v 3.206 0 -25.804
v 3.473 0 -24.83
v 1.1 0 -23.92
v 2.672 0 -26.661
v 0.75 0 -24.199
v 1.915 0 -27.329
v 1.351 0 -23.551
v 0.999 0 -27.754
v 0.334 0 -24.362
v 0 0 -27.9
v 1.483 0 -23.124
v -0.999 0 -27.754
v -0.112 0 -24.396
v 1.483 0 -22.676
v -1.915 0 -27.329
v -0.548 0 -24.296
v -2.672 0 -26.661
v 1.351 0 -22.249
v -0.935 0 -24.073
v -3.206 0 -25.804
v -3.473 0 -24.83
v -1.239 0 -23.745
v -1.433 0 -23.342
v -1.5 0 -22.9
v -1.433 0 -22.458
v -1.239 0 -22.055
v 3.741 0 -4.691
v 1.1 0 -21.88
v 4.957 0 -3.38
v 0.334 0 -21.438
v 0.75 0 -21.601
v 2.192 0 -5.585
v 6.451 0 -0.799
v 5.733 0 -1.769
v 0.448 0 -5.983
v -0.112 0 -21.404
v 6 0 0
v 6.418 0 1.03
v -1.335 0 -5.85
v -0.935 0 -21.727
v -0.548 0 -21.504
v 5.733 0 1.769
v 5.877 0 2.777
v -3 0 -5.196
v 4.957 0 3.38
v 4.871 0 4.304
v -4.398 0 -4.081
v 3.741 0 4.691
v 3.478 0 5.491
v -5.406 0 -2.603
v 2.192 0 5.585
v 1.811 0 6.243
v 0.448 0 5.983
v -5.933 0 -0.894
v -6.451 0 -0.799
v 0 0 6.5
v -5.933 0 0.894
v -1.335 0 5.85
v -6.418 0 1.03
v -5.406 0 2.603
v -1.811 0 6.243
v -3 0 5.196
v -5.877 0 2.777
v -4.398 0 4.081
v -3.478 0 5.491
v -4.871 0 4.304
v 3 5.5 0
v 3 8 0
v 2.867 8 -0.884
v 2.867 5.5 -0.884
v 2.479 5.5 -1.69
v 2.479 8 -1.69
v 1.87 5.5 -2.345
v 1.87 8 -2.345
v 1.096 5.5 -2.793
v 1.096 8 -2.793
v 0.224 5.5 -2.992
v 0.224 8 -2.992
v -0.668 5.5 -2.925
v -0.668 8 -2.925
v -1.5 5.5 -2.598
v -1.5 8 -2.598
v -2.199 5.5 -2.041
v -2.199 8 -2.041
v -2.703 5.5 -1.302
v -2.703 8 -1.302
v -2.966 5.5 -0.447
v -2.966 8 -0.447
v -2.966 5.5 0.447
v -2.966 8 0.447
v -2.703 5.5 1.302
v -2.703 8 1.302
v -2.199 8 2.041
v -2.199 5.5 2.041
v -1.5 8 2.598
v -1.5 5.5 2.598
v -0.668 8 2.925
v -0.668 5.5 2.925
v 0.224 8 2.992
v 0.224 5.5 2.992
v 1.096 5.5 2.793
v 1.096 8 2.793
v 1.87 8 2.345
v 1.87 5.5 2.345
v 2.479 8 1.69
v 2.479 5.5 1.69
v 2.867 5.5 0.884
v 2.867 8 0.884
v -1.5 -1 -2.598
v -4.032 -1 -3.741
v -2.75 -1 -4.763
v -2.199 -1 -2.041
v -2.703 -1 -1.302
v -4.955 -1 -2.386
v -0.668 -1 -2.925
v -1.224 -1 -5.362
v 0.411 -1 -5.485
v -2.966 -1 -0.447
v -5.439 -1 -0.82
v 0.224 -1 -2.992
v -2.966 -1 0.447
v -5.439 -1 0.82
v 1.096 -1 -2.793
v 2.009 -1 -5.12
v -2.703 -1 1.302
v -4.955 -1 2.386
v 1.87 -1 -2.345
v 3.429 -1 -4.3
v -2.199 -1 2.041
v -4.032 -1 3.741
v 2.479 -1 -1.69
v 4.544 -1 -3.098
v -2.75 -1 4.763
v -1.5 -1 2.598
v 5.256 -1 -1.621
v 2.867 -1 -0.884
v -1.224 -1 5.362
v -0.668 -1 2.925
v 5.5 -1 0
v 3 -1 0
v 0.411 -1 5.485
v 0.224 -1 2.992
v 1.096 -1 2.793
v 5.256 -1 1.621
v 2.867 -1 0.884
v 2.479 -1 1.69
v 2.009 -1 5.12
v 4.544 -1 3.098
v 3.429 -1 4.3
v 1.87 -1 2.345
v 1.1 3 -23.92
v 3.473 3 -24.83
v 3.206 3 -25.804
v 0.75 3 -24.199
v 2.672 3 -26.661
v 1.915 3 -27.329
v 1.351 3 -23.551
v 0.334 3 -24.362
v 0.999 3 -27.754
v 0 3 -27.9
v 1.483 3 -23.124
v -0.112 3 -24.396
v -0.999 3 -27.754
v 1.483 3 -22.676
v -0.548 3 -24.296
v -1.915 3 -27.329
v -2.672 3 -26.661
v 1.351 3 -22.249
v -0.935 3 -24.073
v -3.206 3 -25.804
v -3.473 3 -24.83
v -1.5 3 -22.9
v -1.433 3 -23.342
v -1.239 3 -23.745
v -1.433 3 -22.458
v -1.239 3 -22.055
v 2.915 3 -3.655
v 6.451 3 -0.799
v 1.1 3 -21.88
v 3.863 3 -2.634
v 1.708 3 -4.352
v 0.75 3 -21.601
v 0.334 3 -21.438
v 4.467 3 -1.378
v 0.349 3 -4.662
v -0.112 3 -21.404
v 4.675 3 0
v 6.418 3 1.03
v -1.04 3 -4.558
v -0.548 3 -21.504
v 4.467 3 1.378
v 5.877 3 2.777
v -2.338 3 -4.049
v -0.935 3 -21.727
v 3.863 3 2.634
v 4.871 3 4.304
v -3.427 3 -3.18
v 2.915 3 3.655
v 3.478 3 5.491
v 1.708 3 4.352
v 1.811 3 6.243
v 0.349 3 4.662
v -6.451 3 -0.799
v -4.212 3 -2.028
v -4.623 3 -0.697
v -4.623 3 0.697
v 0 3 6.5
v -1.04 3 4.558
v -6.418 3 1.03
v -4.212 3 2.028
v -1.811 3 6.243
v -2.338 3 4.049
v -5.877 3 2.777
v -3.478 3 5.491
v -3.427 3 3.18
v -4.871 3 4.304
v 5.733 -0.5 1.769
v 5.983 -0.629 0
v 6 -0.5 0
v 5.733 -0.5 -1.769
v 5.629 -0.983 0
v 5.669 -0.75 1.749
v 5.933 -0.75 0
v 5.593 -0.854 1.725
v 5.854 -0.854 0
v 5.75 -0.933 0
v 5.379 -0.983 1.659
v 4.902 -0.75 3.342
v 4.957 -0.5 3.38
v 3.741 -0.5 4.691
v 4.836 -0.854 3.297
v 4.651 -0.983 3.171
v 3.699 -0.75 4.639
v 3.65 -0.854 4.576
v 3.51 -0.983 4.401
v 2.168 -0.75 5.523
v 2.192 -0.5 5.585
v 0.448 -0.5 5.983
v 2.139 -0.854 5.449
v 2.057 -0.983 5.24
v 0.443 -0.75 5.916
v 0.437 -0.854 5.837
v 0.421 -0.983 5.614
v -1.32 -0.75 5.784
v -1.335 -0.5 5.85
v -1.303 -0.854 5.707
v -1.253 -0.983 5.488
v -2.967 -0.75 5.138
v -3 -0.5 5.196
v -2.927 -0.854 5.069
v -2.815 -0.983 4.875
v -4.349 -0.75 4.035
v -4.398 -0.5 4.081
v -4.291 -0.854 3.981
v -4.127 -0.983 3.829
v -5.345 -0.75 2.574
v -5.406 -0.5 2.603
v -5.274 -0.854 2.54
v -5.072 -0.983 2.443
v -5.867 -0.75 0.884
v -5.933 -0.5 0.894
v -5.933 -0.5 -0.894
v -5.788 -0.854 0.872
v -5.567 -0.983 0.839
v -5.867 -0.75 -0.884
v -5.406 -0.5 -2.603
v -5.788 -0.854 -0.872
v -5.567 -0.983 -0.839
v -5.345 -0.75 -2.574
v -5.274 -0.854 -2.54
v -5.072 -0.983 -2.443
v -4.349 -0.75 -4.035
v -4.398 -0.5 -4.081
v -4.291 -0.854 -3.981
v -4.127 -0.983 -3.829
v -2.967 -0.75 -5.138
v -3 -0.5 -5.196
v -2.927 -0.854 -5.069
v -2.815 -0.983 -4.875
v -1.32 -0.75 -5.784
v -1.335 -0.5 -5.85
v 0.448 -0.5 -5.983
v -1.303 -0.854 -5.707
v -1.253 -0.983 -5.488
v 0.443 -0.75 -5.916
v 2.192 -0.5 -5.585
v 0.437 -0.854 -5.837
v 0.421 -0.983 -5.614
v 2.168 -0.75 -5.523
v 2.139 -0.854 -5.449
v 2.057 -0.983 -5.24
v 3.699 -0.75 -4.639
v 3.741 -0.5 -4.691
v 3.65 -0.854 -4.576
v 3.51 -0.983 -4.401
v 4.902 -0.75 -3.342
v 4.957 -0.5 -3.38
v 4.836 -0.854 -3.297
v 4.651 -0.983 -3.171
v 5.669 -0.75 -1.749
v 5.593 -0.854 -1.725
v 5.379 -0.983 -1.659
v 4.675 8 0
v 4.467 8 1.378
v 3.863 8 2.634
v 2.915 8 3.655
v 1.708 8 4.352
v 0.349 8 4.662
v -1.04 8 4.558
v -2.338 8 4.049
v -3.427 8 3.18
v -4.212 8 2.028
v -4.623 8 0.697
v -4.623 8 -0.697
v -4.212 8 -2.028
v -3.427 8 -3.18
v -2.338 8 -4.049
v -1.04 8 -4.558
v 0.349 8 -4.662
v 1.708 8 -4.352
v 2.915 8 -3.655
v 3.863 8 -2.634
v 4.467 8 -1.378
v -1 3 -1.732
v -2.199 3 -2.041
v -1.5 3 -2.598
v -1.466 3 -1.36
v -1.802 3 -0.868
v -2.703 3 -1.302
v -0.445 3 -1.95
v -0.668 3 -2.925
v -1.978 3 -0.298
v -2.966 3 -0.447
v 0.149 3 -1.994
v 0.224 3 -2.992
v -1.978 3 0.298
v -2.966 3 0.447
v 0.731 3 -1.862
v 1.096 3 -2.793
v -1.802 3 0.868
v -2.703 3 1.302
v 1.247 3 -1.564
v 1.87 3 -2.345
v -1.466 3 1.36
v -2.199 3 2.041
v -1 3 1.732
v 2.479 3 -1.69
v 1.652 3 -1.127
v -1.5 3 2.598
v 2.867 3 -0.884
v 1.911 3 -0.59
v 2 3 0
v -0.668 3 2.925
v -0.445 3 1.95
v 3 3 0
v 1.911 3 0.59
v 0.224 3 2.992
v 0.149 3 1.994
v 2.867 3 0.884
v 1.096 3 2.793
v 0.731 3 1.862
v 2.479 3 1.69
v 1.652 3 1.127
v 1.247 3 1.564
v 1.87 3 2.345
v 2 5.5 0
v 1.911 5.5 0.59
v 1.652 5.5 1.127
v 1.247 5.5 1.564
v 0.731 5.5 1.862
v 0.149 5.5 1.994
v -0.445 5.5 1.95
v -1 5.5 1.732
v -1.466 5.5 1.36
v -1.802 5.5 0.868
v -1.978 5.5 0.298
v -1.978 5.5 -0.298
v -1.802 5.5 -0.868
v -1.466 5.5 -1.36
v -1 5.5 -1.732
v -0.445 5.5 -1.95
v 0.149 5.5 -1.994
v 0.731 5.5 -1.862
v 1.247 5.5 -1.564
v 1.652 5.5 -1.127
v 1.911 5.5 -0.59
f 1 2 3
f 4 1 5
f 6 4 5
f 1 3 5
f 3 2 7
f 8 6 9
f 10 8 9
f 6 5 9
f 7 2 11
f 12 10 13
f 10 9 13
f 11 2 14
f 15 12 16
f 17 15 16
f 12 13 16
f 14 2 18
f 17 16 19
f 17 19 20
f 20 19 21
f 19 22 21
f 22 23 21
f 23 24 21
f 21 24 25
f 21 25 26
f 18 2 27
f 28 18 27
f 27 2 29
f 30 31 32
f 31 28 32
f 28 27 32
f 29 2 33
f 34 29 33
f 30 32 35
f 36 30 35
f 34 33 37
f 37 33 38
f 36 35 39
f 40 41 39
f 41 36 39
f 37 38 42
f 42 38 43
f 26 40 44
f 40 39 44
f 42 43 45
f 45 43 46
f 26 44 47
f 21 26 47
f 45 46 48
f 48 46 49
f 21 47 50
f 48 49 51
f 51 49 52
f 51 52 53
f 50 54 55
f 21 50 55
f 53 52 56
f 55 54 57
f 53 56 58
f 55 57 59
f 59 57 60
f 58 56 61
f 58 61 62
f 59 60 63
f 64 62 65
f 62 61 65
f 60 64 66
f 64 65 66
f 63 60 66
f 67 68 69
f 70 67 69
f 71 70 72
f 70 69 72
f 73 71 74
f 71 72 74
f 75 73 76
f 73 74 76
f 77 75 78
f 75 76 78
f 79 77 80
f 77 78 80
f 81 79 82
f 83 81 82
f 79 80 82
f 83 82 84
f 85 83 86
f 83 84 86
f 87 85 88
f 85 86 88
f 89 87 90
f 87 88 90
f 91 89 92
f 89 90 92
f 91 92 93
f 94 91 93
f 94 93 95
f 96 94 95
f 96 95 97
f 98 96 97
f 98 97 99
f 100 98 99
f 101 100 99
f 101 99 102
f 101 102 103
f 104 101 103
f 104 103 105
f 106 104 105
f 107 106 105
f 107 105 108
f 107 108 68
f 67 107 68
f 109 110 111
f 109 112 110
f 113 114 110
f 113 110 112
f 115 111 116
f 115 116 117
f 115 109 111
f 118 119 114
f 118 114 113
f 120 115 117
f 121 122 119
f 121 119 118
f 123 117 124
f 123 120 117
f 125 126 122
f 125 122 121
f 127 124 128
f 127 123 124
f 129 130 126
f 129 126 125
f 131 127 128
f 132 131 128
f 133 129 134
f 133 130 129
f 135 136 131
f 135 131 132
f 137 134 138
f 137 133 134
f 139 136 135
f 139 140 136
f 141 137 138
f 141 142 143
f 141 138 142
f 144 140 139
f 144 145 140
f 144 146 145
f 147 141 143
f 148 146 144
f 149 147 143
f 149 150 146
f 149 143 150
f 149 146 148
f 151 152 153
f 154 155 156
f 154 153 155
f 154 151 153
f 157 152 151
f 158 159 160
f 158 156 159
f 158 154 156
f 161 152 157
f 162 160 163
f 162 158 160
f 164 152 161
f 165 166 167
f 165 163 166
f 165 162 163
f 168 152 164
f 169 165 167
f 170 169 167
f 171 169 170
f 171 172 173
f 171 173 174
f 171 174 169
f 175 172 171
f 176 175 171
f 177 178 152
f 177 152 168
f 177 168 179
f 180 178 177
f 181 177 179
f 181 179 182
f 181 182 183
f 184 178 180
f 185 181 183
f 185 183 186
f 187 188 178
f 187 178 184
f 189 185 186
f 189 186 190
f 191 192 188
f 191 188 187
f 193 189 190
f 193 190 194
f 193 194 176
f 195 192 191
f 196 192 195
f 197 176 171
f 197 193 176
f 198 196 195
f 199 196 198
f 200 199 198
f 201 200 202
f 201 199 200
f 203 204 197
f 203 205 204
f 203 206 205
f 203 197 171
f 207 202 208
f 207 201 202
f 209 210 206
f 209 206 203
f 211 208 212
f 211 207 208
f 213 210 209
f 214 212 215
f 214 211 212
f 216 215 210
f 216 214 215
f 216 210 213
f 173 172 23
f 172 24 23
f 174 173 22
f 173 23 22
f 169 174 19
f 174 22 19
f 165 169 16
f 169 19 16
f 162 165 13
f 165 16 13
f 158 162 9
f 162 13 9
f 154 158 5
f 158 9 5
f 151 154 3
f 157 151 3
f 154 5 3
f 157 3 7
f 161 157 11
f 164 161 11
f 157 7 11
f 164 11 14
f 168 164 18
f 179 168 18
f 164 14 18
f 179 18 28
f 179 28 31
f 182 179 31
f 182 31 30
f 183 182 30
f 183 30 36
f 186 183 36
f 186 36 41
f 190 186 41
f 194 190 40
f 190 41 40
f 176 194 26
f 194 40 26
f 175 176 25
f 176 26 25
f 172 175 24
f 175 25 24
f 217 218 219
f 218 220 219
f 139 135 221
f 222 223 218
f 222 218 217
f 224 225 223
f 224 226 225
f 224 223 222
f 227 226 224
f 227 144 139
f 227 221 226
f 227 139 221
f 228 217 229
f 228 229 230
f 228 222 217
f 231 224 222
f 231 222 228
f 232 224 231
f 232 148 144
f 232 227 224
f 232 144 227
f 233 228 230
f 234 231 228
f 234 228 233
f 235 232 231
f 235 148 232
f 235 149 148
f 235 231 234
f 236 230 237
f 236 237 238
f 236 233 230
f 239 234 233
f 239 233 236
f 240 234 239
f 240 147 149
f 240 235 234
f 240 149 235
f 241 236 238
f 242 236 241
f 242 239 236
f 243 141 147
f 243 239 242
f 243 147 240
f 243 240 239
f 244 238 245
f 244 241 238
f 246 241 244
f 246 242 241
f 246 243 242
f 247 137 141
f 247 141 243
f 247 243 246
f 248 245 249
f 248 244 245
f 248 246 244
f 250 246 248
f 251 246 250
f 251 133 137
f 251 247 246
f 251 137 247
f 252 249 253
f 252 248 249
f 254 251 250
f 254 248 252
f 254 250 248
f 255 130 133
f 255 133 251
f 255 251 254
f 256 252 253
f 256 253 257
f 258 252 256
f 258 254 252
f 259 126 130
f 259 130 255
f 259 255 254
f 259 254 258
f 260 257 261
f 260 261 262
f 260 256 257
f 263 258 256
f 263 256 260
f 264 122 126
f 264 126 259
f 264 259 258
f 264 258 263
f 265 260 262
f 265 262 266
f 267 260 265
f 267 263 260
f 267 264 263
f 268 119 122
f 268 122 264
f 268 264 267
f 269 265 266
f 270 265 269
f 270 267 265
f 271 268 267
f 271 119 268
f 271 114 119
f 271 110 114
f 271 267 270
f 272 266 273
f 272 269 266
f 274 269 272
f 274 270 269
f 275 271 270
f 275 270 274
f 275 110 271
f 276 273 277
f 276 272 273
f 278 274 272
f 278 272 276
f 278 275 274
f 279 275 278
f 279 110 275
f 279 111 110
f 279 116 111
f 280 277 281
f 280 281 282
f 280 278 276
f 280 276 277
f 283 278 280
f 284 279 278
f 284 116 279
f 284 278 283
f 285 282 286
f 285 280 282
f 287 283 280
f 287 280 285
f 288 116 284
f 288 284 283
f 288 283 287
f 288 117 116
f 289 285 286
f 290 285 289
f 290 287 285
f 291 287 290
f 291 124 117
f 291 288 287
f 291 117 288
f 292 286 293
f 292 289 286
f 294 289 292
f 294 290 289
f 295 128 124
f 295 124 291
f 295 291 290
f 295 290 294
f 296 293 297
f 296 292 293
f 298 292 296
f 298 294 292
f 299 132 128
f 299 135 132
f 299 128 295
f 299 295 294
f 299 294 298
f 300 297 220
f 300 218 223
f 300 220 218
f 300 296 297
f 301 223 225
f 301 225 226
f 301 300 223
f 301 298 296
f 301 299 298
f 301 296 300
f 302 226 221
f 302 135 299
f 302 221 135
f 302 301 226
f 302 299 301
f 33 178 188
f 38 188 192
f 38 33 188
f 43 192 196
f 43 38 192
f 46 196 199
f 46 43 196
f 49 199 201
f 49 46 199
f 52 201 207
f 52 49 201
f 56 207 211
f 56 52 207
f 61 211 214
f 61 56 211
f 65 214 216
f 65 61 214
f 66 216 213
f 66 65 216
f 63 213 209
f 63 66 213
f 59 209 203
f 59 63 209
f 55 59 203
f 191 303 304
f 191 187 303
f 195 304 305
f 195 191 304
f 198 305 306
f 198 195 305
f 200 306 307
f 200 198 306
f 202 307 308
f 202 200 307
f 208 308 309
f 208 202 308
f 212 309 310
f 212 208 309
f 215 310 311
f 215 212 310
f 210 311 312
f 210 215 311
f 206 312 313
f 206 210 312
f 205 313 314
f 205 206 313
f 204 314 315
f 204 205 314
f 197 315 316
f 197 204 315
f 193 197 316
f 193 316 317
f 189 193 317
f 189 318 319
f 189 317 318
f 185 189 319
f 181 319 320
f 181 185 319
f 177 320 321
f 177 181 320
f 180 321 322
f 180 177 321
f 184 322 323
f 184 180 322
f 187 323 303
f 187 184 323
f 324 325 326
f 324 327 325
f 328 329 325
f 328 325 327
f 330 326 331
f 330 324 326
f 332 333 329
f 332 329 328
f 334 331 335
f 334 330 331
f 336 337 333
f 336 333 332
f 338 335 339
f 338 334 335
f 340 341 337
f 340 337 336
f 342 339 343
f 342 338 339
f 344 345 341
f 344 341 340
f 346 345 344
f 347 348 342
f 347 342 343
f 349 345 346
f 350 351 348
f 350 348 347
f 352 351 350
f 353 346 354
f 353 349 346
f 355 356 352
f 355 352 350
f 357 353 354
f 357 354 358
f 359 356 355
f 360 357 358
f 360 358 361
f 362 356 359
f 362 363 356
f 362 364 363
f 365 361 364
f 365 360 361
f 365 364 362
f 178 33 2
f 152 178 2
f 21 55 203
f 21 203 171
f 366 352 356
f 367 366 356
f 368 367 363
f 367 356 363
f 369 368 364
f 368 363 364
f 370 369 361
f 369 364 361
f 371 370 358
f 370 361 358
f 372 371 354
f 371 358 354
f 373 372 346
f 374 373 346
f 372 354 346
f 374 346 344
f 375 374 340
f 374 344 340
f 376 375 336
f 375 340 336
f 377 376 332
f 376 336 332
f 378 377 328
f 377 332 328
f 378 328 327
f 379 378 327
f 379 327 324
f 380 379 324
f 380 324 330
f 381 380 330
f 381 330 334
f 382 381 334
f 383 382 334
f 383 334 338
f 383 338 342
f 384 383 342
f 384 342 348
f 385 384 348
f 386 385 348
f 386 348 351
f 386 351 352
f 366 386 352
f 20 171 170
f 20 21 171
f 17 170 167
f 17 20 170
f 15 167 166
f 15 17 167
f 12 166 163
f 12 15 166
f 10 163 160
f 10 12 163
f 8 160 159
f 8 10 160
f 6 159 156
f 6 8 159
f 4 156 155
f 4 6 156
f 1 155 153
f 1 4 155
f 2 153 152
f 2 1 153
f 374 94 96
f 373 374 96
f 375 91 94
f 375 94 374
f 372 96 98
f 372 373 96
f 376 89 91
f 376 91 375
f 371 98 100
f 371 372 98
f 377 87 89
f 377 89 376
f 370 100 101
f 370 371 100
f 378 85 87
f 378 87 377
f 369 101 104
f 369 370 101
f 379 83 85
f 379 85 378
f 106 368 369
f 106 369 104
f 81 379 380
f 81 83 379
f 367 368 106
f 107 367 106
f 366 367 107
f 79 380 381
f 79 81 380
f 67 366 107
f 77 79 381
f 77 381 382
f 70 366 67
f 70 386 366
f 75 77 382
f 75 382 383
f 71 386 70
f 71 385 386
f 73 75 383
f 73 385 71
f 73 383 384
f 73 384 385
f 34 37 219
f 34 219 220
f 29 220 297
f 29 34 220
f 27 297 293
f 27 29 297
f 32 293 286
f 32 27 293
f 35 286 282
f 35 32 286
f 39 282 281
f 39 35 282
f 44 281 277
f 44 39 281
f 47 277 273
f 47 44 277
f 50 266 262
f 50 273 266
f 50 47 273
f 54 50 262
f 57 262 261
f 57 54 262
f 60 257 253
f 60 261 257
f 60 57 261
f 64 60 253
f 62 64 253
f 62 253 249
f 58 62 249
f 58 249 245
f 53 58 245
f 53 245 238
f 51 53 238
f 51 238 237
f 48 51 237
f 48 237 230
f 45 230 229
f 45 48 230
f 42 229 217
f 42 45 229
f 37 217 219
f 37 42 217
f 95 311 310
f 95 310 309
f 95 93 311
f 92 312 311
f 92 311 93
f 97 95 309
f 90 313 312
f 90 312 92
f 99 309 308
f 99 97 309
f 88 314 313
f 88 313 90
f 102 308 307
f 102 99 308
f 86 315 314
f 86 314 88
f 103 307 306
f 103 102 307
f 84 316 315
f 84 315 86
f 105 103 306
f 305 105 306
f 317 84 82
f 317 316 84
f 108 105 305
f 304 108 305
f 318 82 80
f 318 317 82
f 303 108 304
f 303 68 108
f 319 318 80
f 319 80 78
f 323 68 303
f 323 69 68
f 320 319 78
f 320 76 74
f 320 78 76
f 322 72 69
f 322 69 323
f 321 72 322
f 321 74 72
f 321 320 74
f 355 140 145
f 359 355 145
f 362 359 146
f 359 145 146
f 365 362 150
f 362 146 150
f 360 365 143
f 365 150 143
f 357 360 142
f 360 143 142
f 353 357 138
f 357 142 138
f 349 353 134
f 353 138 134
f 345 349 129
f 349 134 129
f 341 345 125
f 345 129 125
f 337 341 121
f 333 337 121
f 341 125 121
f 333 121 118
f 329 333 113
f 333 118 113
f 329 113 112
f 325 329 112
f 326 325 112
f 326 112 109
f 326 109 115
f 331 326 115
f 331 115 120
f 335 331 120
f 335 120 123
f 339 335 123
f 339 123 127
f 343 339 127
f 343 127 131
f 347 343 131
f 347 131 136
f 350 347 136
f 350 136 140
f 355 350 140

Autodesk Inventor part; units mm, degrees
ref_plane "YZ Plane" through (0, 0, 0) normal (1, 0, 0) x (0, 1, 0)
ref_plane "XZ Plane" through (0, 0, 0) normal (0, 1, 0) x (-1, 0, 0)
ref_plane "XY Plane" through (0, 0, 0) normal (0, 0, 1) x (1, 0, 0)
sketch "Sketch1" plane through (0, 0, 0) normal (0, 1, 0) x (-1, 0, 0)
  arc A0 (6.4507, -0.7992) -> (-6.4507, -0.7992) centre (0, 0) ccw
  arc A1 (-3.4734, -24.8303) -> (3.4734, -24.8303) centre (0, -24.4) ccw
  line L0 (0, -34.78) -> (0, 13.38) projected
  line L1 (6.4507, -0.7992) -> (3.4734, -24.8303)
  line L2 (-6.4507, -0.7992) -> (-3.4734, -24.8303)
  circle A2 centre (0, -22.9) radius 1.5
  dimension "d0" = 13
  dimension "d1" = 7
  dimension "d2" = 34.4
  dimension "d3" = 3
  dimension "d4" = 1.5
extrude "Extrusion1" add sketch "Sketch1" along normal blind 3 contours L1 A1 L0 A2 A0 | L0 A2 A1 L2 A0
sketch "Sketch2" plane through (0, 3, 0) normal (0, 1, 0) x (1, 0, 0)
  circle A0 centre (0, 0) radius 4.675
  dimension "d7" = 9.35
extrude "Extrusion2" add sketch "Sketch2" along normal blind 5
sketch "Sketch3" plane through (0, 8, 0) normal (0, 1, 0) x (1, 0, 0)
  circle A0 centre (0, 0) radius 3
  dimension "d10" = 6
extrude "Extrusion3" cut sketch "Sketch3" against normal blind 2.5
sketch "Sketch4" plane through (0, 0, 0) normal (0, -1, 0) x (1, 0, 0)
  circle A0 centre (0, 0) radius 6
  dimension "d13" = 12
extrude "Extrusion4" add sketch "Sketch4" along normal blind 1
fillet "Fillet1" radius 0.5 1 edges at (-6, -1, 0)
sketch "Sketch5" plane through (0, -1, 0) normal (0, -1, 0) x (1, 0, 0)
  circle A0 centre (0, 0) radius 3
  dimension "d17" = 6
extrude "Extrusion5" cut sketch "Sketch5" against normal blind 4
sketch "Sketch6" plane through (0, 3, 0) normal (0, -1, 0) x (1, 0, 0)
  circle A0 centre (0, 0) radius 2
  dimension "d20" = 4
extrude "Extrusion6" cut sketch "Sketch6" against normal through all
properties part number "RCT-P070_servo_linkage"
